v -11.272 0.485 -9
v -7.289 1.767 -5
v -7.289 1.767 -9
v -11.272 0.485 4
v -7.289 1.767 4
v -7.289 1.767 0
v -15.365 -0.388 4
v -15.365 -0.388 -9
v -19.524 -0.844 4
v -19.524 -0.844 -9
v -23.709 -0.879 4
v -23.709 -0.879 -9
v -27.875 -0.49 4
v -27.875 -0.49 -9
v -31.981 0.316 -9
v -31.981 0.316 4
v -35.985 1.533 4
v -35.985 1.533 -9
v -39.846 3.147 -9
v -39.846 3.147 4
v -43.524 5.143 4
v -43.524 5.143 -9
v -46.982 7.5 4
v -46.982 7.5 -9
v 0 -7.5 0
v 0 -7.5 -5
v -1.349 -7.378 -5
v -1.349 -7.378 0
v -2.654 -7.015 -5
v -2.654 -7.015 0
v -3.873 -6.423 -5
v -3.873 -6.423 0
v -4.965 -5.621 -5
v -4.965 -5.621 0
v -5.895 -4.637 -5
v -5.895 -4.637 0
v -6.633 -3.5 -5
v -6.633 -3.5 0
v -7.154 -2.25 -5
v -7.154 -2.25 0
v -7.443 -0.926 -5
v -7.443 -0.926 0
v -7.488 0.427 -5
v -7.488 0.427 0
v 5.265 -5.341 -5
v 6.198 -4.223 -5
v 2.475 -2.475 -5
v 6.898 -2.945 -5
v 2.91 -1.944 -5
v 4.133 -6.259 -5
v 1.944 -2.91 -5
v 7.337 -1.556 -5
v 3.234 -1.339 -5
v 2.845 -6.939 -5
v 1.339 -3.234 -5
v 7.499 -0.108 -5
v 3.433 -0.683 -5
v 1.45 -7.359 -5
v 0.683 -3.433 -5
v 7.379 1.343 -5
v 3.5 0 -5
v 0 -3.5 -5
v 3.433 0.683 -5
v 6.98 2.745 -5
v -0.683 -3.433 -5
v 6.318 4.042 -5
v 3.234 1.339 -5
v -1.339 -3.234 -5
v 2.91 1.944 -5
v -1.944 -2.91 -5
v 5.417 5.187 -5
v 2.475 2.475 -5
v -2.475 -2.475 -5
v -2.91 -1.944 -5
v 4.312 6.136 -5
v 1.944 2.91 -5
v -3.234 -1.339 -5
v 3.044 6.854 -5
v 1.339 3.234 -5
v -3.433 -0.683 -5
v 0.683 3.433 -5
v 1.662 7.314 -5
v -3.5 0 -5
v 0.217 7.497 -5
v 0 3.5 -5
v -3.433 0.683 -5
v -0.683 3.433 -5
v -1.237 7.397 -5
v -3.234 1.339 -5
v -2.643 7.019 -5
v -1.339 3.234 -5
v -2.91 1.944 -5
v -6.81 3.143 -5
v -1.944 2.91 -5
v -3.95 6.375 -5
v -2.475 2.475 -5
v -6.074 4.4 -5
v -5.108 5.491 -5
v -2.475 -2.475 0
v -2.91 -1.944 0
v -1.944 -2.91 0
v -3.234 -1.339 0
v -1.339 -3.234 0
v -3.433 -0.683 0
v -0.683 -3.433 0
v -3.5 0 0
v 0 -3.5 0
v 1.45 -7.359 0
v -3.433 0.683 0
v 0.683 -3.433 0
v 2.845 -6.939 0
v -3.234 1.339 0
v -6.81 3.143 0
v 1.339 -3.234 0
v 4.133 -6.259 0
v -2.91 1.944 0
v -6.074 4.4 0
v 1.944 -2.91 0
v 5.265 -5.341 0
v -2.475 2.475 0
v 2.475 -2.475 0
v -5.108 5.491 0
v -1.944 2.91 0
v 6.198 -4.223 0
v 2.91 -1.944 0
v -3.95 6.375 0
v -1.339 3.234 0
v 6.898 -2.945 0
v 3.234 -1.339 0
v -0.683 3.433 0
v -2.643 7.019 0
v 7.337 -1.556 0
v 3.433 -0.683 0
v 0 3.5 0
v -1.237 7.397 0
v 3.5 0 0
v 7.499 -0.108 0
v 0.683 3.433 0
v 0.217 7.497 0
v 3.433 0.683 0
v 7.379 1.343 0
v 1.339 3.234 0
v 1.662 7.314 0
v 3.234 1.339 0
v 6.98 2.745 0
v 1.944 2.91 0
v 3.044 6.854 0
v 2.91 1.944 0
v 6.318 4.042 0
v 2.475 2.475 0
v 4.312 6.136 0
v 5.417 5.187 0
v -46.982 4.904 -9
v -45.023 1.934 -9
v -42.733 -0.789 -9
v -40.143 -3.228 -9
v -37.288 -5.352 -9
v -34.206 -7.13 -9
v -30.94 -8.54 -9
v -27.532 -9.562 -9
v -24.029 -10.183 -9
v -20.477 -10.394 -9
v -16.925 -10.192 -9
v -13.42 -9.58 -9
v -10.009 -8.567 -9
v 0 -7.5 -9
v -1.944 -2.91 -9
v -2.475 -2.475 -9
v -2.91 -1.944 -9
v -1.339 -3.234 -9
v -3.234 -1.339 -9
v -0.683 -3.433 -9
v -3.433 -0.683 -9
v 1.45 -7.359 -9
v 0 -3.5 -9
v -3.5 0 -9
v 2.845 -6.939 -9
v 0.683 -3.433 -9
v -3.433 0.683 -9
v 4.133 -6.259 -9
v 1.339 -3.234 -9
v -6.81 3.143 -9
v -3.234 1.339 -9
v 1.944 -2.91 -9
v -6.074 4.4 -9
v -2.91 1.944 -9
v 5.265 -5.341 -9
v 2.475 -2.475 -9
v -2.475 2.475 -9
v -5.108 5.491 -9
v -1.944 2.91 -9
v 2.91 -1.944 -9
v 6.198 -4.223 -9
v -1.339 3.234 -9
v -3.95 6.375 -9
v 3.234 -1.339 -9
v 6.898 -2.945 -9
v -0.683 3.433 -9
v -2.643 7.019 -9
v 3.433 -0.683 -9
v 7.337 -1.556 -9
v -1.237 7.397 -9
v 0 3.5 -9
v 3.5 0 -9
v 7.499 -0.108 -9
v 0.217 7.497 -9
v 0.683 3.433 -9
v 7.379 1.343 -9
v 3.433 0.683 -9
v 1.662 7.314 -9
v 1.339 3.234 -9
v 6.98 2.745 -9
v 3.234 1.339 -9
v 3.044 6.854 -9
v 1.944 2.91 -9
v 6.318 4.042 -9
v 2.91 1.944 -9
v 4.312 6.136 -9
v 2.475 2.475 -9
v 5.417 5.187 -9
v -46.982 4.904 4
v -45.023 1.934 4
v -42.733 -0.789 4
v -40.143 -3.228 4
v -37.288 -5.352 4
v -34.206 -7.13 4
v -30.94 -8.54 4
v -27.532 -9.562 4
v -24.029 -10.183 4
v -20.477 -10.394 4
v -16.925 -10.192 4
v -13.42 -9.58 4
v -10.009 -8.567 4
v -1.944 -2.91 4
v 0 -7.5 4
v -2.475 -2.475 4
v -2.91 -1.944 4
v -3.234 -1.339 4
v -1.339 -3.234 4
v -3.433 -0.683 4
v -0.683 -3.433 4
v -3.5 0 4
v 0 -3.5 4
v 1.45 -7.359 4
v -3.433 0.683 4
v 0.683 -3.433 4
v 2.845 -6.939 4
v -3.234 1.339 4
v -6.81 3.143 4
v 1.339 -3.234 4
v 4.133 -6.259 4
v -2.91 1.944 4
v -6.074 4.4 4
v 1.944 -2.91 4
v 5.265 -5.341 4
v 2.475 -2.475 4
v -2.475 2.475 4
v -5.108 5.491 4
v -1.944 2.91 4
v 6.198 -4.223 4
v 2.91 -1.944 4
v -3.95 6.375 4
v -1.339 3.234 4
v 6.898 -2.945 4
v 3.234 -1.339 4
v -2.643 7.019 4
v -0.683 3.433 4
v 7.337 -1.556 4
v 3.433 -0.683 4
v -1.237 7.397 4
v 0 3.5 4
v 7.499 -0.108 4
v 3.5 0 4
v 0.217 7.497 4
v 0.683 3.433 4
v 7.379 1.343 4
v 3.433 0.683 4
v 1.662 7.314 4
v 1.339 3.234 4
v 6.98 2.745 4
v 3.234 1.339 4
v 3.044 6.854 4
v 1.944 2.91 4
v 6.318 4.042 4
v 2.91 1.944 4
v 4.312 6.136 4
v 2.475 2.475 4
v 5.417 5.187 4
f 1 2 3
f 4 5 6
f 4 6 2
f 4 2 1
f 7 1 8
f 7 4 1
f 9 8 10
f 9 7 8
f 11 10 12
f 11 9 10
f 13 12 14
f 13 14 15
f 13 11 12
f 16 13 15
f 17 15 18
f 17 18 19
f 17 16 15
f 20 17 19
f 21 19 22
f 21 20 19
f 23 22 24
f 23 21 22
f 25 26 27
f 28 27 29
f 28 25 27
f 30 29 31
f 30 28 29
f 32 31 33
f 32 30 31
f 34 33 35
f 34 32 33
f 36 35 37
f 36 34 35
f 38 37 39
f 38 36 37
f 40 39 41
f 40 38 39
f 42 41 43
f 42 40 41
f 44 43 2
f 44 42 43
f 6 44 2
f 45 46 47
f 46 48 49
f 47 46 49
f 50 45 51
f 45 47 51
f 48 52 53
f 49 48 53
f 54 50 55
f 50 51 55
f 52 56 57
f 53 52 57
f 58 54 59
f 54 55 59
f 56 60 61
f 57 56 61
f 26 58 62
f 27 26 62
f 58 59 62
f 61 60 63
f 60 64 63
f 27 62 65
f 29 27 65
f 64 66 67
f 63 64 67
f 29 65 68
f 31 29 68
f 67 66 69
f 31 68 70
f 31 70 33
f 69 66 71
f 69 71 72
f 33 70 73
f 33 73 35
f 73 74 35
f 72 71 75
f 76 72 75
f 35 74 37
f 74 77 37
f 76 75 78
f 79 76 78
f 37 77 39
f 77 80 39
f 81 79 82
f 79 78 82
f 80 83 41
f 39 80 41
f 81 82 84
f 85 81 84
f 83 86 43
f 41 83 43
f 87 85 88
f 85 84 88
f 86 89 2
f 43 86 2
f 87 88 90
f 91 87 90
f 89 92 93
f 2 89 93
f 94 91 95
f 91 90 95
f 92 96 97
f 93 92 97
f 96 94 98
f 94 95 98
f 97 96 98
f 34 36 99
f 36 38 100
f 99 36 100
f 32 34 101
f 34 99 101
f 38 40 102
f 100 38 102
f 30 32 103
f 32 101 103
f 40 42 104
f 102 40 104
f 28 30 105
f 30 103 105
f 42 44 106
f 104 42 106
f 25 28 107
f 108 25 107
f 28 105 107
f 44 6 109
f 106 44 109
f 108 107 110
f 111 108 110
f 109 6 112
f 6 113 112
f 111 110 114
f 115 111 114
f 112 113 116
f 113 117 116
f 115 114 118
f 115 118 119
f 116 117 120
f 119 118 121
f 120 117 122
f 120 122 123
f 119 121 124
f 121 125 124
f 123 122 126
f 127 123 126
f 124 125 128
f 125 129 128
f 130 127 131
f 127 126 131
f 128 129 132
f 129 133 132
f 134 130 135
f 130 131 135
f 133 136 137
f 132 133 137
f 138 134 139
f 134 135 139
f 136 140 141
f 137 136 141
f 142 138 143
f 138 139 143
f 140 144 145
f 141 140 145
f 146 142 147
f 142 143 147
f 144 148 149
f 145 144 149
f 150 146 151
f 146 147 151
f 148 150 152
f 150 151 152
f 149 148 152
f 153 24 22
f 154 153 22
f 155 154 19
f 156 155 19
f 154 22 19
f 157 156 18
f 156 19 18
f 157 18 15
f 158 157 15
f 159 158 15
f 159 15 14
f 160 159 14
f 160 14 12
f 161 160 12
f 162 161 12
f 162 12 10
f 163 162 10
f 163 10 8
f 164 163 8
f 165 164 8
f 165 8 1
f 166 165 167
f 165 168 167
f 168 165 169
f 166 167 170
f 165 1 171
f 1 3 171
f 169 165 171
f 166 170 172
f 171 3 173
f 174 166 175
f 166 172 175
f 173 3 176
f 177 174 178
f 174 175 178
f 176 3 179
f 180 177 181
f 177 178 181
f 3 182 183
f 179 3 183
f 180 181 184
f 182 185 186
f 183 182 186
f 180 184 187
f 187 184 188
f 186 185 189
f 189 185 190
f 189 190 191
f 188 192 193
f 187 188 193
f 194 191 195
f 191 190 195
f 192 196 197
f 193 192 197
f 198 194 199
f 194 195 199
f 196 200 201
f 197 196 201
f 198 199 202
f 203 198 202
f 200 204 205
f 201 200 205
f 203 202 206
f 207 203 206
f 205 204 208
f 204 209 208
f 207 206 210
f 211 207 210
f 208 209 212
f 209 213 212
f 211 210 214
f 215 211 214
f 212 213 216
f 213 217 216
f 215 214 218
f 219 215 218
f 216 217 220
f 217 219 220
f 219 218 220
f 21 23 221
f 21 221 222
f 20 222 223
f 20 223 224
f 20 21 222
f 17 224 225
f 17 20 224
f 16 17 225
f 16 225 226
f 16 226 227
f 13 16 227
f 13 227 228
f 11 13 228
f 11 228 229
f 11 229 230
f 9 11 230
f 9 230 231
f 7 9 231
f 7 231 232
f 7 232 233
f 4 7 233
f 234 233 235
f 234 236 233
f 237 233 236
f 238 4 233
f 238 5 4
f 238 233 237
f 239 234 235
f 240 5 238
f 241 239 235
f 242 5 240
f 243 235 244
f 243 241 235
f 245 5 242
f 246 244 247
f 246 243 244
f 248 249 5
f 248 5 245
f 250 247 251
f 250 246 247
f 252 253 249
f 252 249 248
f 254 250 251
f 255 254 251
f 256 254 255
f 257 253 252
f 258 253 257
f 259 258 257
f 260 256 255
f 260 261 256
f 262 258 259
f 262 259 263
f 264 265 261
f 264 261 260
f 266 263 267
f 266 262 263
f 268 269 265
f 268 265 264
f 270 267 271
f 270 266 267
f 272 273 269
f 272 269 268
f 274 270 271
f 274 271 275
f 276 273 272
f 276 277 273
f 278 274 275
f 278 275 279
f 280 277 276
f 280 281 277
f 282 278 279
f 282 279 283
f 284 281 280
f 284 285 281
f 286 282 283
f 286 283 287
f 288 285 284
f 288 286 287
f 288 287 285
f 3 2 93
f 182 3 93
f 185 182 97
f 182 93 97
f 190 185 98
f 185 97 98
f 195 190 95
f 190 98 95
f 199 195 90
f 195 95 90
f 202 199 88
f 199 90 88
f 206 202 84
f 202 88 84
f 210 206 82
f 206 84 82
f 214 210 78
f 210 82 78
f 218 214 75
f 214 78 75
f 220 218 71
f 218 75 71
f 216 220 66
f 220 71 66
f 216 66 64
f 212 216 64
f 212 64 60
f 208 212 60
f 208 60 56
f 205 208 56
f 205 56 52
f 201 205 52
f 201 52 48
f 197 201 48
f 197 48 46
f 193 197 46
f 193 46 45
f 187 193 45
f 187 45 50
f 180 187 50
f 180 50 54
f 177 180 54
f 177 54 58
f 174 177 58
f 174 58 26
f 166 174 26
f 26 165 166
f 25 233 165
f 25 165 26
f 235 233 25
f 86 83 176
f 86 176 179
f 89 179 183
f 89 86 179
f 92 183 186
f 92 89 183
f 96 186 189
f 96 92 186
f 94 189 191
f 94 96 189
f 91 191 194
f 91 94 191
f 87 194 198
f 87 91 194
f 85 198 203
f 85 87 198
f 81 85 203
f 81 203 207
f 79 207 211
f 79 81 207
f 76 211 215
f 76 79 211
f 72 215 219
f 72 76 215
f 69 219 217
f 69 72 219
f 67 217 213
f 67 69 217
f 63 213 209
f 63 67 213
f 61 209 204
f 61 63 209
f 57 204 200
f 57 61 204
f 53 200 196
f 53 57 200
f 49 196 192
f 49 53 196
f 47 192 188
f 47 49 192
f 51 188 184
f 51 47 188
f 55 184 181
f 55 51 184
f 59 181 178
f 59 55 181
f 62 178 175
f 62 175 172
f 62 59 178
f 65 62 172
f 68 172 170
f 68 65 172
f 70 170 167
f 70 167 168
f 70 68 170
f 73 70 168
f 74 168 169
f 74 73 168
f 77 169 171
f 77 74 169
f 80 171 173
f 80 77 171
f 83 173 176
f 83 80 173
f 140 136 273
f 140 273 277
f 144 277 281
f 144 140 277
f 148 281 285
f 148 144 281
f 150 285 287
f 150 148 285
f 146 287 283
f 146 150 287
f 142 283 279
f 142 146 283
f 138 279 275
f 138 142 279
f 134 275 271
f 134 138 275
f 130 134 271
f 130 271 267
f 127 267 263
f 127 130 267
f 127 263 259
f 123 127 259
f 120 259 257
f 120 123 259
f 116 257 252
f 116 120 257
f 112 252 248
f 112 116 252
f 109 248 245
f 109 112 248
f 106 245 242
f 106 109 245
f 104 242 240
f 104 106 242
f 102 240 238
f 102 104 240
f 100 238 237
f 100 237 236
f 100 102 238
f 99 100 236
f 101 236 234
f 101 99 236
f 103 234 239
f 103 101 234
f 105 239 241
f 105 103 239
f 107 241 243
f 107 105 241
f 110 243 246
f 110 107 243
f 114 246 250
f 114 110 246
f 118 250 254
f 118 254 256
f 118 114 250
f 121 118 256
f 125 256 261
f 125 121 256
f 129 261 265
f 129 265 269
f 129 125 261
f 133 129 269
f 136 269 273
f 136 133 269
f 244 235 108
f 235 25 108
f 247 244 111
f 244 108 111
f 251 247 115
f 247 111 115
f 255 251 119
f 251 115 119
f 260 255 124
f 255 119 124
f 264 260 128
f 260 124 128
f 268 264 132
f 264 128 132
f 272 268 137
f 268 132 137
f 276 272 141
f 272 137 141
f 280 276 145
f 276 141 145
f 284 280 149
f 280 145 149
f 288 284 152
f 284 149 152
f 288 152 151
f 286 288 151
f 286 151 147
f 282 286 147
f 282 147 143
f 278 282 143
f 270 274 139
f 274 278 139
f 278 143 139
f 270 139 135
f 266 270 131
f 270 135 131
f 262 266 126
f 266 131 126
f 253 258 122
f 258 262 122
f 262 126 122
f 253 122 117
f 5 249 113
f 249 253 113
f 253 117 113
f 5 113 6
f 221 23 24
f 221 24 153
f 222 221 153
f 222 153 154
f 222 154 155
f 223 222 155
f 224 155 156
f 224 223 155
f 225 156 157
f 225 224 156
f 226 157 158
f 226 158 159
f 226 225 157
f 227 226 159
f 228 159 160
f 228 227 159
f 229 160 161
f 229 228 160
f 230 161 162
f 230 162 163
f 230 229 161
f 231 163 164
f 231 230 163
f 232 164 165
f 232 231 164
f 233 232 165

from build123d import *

# Parameters (mm, degrees)
CROQUIS1_R              = 7.5
CROQUIS1_R_2            = 3.5
SALIENTE_EXTRUIR1_DEPTH = 4
CROQUIS2_R              = 2.193779366
SALIENTE_EXTRUIR2_DEPTH = 5
CROQUIS3_R              = 7.5
CROQUIS3_R_2            = 3.5
SALIENTE_EXTRUIR3_DEPTH = 4
CROQUIS4_R              = 2.193779366
CORTAR_EXTRUIR1_DEPTH   = 14
SALIENTE_EXTRUIR4_DEPTH = 13


with BuildPart() as part:
    # Croquis1 → Saliente-Extruir1 (new body)
    with BuildSketch(Plane.XY):
        Circle(CROQUIS1_R)
        Circle(CROQUIS1_R_2, mode=Mode.SUBTRACT)
    extrude(amount=SALIENTE_EXTRUIR1_DEPTH)



with BuildPart() as body_2:
    # Croquis2 → Saliente-Extruir2 (new body)
    with BuildSketch(Plane(origin=(0, 0, 0), x_dir=(-1, 0, 0), z_dir=(0, 0, -1))):
        Circle(CROQUIS2_R)
    extrude(amount=SALIENTE_EXTRUIR2_DEPTH)

    # Croquis4 → Cortar-Extruir1 (cut)
    with BuildSketch(Plane(origin=(0, 0, -5), x_dir=(-1, 0, 0), z_dir=(0, 0, -1))):
        Circle(CROQUIS4_R)
    extrude(amount=-CORTAR_EXTRUIR1_DEPTH, mode=Mode.SUBTRACT)


with BuildPart() as body_3:
    # Croquis3 → Saliente-Extruir3 (new body)
    with BuildSketch(Plane(origin=(0, 0, -5), x_dir=(-1, 0, 0), z_dir=(0, 0, -1))):
        Circle(CROQUIS3_R)
        Circle(CROQUIS3_R_2, mode=Mode.SUBTRACT)
    extrude(amount=SALIENTE_EXTRUIR3_DEPTH)


with BuildPart() as part_1:
    add(part.part)

    add(body_3.part)  # Saliente-Extruir4 merges body 3
    # Croquis5 → Saliente-Extruir4 (add)
    with BuildSketch(Plane.XY.offset(4)):
        with BuildLine():
            Line((-10.009282788, -8.566914266), (0, -7.5))
            ThreePointArc((0, -7.5), (-5.895156044, -4.636500319), (-7.288771435, 1.76743061))
            ThreePointArc((-7.288771435, 1.76743061), (-27.875344012, -0.49038836), (-46.981845806, 7.5))
            Line((-46.981845806, 7.5), (-46.981845806, 4.90393409))
            ThreePointArc((-46.981845806, 4.90393409), (-30.939741801, -8.539865418), (-10.009282788, -8.566914266))
        make_face()
    extrude(amount=-SALIENTE_EXTRUIR4_DEPTH)


solid = part_1.part
